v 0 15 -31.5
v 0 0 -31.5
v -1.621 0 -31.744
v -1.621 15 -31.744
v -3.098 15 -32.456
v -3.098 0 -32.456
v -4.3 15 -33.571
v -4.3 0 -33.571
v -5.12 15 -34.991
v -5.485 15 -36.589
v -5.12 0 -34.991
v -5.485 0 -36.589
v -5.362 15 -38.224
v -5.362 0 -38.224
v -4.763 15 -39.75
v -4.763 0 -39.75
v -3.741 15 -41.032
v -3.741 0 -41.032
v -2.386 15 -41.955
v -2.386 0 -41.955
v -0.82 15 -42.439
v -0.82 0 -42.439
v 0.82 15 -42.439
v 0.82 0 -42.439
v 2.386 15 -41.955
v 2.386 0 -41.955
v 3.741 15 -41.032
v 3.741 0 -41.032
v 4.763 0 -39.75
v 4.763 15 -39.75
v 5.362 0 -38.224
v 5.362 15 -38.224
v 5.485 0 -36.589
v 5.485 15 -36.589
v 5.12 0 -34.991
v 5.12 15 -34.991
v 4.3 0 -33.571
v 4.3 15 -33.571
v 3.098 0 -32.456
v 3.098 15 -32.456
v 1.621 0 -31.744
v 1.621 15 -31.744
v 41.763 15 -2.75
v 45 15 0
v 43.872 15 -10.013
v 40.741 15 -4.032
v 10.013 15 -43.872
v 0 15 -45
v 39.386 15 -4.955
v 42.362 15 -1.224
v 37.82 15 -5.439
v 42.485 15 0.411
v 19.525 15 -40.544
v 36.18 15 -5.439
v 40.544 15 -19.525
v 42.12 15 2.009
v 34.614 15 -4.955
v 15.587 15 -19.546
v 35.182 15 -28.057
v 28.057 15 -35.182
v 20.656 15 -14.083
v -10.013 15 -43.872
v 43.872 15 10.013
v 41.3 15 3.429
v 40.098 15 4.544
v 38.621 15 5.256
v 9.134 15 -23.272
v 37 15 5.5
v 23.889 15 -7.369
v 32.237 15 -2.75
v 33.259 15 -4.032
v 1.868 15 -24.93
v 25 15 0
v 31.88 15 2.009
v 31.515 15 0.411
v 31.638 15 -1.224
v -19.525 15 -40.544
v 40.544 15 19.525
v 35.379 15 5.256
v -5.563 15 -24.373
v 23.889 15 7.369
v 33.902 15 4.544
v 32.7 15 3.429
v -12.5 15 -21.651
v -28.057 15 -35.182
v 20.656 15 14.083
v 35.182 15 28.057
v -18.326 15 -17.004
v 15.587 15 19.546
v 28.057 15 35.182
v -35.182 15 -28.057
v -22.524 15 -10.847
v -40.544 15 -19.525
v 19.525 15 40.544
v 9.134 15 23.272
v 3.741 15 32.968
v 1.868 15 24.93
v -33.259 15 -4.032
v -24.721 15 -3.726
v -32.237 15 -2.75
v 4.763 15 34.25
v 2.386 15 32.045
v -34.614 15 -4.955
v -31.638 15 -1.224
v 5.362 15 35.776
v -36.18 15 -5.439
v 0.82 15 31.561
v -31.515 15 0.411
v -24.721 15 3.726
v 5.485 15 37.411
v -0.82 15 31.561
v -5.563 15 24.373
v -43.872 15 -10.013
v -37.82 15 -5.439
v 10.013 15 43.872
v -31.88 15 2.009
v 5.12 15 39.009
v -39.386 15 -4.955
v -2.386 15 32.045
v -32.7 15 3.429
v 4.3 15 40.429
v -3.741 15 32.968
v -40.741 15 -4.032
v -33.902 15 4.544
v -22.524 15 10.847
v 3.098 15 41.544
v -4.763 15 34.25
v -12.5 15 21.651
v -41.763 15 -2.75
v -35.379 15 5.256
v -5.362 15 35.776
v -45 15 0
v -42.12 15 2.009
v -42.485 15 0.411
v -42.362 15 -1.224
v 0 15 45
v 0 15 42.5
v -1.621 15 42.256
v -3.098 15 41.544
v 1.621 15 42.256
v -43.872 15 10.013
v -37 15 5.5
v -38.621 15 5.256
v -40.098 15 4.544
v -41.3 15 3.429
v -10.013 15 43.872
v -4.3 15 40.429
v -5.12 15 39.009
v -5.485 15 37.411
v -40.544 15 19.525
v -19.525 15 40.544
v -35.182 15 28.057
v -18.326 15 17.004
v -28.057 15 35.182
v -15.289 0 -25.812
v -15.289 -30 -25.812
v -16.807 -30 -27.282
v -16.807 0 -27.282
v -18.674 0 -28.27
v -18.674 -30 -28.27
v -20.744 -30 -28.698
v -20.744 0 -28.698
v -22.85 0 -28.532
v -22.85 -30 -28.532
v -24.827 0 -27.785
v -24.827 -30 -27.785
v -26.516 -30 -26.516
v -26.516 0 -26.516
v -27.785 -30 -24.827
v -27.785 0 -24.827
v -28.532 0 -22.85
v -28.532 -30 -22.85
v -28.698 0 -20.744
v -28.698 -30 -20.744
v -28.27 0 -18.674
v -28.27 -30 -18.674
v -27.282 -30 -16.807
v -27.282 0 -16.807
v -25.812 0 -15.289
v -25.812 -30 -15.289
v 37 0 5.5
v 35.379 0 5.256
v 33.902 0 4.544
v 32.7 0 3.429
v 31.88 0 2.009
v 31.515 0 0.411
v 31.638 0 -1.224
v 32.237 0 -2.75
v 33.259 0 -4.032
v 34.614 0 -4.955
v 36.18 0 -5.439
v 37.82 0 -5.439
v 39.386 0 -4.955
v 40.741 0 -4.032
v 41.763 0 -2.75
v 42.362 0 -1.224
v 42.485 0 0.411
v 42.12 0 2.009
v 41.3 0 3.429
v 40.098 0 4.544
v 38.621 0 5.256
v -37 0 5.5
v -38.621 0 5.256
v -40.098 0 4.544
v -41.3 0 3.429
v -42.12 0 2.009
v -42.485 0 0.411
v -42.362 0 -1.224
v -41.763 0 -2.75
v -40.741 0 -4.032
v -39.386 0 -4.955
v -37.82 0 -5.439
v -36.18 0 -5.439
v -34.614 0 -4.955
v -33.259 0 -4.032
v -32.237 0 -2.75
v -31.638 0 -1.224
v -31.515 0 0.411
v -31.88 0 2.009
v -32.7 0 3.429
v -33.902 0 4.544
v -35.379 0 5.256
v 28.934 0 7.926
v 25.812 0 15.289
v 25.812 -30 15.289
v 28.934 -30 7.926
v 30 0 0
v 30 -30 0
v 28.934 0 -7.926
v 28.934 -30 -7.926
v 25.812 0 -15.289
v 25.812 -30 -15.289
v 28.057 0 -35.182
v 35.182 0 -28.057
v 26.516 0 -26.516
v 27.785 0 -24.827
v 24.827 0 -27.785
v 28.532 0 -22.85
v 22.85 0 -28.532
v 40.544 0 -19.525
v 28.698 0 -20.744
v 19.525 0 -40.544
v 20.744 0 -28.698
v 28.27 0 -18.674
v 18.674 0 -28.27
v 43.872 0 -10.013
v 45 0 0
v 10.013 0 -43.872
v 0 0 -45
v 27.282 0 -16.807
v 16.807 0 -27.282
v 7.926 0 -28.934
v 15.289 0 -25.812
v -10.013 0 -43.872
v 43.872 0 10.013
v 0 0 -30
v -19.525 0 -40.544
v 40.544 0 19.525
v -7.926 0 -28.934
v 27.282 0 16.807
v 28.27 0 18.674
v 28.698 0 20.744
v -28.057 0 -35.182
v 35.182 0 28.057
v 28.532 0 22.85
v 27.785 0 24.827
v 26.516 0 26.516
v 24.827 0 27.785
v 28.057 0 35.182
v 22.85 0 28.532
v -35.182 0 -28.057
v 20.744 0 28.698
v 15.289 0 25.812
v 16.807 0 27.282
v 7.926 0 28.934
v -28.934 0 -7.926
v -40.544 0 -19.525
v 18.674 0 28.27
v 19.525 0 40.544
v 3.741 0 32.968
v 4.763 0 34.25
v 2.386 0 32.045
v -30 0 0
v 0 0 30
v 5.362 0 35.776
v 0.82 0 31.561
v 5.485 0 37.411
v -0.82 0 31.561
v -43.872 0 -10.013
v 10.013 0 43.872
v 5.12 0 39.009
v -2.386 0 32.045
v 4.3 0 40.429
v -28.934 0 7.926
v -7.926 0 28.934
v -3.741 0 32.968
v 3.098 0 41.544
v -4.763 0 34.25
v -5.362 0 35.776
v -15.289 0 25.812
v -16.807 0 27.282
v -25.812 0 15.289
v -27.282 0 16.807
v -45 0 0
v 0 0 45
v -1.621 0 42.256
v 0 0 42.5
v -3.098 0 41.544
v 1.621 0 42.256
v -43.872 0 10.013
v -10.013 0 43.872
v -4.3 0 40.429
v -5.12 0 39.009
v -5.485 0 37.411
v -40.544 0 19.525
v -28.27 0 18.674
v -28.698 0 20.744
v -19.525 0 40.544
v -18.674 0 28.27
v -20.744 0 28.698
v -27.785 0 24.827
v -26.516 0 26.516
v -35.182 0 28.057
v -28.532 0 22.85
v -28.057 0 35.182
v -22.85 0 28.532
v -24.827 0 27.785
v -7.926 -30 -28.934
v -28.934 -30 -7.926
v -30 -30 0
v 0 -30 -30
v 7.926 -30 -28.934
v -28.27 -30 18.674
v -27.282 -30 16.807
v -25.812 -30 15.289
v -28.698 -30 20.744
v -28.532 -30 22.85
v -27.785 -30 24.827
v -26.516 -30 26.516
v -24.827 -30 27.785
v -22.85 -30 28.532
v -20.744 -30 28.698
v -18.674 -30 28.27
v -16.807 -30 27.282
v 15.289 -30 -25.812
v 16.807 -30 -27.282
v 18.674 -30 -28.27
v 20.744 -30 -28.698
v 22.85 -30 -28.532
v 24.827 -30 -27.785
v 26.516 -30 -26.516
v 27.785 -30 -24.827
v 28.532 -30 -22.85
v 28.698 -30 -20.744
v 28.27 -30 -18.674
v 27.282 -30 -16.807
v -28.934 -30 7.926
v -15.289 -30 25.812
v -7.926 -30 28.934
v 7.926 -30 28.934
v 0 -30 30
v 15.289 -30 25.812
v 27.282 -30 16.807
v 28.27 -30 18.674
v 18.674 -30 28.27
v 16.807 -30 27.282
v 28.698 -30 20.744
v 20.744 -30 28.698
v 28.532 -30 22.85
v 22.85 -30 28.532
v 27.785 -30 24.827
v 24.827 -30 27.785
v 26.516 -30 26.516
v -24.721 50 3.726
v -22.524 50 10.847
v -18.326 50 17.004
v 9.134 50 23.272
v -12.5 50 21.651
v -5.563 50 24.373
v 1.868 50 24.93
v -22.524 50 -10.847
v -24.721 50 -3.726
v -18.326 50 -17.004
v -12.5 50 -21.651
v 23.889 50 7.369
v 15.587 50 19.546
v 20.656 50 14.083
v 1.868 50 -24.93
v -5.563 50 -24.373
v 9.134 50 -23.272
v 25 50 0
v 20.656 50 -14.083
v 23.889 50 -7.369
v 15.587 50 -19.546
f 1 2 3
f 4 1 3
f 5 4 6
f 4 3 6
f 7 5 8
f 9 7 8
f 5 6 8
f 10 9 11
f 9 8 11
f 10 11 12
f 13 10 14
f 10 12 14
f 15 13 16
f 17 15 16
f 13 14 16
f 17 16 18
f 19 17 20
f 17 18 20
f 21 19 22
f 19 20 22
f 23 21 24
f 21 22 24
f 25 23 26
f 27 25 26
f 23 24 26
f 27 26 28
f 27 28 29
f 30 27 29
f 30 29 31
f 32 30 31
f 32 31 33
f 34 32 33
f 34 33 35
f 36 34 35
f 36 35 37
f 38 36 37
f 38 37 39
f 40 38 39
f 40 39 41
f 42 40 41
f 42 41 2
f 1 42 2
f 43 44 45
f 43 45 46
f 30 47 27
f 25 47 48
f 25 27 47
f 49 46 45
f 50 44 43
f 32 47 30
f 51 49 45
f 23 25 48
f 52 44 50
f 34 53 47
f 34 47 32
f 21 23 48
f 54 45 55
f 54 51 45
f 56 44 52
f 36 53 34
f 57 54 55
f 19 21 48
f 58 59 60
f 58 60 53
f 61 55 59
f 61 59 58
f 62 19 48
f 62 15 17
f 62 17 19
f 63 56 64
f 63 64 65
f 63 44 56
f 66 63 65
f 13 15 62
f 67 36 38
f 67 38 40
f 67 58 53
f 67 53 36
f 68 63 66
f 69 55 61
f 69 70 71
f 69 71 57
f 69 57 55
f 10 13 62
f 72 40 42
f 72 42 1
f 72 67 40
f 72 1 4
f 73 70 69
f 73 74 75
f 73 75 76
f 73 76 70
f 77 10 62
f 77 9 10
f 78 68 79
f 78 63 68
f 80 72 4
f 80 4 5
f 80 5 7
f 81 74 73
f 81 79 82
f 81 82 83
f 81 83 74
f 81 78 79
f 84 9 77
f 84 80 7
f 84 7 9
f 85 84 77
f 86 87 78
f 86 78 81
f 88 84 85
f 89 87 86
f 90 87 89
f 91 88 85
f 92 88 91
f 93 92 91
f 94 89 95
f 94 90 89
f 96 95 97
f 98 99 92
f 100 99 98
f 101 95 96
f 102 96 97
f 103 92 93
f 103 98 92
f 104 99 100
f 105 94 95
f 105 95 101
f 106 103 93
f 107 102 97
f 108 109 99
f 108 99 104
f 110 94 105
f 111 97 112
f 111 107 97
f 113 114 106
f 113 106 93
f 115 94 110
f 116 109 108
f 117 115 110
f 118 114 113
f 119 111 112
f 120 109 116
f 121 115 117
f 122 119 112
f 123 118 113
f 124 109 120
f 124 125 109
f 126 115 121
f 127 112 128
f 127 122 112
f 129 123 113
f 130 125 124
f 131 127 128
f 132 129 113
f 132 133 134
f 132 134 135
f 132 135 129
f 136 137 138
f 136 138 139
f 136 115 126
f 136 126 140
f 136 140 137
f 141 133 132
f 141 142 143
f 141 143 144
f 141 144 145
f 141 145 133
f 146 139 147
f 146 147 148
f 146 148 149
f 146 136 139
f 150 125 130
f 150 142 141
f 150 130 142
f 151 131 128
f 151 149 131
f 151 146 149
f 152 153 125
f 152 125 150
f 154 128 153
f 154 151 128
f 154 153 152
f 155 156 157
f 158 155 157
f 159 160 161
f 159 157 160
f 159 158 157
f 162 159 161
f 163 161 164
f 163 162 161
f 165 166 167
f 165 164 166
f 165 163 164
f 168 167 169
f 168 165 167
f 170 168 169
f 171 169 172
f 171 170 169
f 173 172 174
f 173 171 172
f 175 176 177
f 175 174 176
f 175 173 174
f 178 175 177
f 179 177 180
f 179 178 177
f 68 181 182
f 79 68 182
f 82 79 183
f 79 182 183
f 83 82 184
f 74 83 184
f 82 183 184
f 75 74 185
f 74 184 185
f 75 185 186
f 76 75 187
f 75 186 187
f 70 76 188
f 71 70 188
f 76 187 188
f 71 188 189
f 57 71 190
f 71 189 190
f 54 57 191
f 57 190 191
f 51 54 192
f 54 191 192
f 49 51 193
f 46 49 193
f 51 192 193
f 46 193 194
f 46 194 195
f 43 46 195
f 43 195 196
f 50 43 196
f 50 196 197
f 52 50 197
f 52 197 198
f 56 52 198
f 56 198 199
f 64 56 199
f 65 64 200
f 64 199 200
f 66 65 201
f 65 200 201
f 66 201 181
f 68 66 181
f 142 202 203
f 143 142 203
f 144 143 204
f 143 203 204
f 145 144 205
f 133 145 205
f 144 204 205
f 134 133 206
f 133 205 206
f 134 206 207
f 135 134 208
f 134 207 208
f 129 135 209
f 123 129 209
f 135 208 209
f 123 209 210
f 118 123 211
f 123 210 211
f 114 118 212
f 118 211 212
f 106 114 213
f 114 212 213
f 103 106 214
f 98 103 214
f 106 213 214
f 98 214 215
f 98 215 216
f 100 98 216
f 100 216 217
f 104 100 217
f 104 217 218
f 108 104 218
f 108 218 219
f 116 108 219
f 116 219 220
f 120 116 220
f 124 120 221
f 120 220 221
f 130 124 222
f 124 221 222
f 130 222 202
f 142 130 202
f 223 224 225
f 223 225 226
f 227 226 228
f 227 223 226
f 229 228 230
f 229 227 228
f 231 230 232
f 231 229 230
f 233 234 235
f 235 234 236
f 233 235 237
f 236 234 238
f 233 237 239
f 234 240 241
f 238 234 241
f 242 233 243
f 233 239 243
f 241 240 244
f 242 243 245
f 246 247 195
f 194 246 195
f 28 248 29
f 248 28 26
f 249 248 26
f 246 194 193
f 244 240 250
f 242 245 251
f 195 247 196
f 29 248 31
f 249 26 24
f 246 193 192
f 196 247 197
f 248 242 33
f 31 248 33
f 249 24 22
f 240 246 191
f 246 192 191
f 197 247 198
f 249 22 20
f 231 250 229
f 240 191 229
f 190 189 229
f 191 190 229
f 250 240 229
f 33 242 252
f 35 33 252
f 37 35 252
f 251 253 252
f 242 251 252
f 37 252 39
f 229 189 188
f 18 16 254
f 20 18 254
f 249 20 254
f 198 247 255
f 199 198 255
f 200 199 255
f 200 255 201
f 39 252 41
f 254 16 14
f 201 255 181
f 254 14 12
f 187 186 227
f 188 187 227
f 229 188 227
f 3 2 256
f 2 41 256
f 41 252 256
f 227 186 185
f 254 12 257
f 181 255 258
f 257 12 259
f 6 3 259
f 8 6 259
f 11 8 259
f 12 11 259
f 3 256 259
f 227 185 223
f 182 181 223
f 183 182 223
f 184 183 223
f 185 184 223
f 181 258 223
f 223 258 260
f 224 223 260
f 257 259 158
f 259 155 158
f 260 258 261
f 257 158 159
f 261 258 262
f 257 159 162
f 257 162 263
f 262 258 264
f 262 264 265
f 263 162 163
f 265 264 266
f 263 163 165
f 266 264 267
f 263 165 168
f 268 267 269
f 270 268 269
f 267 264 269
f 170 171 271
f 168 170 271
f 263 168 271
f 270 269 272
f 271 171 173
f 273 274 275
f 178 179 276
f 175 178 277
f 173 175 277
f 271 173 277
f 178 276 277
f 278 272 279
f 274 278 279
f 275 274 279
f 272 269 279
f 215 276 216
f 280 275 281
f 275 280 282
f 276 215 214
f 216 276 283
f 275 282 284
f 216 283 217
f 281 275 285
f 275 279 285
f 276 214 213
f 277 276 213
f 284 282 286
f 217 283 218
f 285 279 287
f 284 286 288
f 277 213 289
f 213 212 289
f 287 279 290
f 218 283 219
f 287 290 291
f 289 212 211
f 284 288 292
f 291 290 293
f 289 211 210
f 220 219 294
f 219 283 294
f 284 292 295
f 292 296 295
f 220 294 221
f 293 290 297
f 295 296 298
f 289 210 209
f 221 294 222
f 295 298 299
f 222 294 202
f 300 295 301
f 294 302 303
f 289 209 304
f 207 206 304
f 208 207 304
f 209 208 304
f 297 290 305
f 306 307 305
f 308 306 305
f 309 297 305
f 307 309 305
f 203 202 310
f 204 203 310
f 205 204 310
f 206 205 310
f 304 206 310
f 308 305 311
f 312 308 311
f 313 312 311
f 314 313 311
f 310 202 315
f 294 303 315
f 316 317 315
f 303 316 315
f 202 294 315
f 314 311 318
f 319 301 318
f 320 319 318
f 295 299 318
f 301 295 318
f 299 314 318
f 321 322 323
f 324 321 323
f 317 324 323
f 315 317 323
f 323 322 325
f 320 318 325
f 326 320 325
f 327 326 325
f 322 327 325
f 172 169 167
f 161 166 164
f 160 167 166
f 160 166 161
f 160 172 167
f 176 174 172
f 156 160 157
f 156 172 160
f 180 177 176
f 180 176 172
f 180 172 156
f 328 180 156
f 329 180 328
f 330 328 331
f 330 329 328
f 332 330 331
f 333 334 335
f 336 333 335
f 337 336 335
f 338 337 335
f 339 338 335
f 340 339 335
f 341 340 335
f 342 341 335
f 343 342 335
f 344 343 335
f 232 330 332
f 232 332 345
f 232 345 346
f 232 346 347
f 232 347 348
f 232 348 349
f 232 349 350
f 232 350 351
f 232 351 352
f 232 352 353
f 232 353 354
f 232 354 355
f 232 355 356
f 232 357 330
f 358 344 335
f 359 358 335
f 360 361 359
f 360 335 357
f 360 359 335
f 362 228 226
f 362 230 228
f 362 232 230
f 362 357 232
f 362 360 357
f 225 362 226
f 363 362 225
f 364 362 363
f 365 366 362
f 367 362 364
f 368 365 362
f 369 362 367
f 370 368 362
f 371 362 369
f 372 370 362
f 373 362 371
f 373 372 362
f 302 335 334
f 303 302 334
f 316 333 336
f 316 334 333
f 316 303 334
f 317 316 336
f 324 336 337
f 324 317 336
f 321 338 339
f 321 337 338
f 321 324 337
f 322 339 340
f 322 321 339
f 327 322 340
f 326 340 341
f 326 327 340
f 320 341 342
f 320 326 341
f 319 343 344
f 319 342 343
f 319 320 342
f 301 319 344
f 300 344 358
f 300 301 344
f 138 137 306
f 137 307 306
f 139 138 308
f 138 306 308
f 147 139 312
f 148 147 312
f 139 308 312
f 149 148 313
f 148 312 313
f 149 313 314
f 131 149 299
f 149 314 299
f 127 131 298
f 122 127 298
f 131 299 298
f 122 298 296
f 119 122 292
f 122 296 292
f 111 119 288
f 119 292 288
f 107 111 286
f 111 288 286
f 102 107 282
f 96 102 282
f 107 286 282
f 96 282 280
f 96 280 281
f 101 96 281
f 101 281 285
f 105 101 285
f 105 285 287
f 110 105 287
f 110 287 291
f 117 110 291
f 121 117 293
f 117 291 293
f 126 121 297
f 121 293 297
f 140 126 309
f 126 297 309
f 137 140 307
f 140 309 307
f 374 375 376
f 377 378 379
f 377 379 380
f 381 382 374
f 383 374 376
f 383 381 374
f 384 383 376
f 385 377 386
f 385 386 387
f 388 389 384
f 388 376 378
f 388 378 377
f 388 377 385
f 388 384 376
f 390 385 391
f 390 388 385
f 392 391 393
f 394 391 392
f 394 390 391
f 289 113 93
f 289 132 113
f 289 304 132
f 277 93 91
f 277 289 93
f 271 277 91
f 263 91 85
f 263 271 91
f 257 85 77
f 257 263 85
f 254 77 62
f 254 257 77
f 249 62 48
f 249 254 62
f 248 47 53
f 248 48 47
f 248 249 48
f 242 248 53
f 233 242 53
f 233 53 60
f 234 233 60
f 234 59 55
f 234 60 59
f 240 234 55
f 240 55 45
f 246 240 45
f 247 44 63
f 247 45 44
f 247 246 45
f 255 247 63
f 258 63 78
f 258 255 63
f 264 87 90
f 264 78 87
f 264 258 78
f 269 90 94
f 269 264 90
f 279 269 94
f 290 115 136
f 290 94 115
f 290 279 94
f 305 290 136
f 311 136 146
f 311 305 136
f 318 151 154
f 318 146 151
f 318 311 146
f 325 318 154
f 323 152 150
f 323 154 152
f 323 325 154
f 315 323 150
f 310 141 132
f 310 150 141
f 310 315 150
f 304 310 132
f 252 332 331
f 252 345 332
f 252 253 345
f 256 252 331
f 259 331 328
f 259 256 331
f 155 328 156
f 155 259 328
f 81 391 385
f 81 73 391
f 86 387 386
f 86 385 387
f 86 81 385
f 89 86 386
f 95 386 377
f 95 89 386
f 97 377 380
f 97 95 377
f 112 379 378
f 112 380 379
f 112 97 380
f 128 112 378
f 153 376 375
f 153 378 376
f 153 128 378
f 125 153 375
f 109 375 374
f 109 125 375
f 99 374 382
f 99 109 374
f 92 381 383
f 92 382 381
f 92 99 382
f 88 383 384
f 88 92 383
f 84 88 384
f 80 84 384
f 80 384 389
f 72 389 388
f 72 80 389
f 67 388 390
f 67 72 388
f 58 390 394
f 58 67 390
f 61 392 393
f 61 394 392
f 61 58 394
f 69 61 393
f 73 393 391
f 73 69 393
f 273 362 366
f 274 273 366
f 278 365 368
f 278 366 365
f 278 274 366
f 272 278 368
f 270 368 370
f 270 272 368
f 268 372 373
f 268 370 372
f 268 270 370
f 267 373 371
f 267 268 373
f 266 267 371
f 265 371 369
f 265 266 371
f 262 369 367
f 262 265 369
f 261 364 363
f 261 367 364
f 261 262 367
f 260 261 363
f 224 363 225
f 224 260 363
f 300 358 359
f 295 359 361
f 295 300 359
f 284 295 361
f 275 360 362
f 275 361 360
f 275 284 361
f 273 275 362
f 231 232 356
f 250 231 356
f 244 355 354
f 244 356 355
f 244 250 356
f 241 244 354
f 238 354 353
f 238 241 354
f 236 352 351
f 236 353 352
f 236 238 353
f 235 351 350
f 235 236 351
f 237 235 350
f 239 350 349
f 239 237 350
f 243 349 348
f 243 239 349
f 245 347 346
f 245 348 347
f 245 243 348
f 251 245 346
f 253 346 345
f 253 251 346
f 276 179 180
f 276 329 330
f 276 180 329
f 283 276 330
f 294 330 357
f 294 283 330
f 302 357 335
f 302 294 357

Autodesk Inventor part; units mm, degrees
ref_plane "YZ Plane" through (0, 0, 0) normal (1, 0, 0) x (0, 1, 0)
ref_plane "XZ Plane" through (0, 0, 0) normal (0, 1, 0) x (-1, 0, 0)
ref_plane "XY Plane" through (0, 0, 0) normal (0, 0, 1) x (1, 0, 0)
sketch "Эскиз1" plane through (0, 0, 0) normal (0, 1, 0) x (-1, 0, 0)
  circle A0 centre (0, 0) radius 45
  dimension "d0" = 90
extrude "Выдавливание1" add sketch "Эскиз1" along normal blind 15
sketch "Эскиз3" plane through (0, 0, 0) normal (0, -1, 0) x (1, 0, 0)
  circle A0 centre (0, 0) radius 30
  line L0 (-15.9099, 15.9099) -> (-21.2132, 21.2132)
  line L1 (0, 0) -> (30, 0) construction
  line L2 (-15.9099, -15.9099) -> (-21.2132, -21.2132)
  line L3 (0, 0) -> (30, 0) construction
  line L4 (15.9099, -15.9099) -> (21.2132, -21.2132)
  line L5 (0, 0) -> (30, 0) construction
  line L6 (15.9099, 15.9099) -> (21.2132, 21.2132)
  line L7 (0, 0) -> (30, 0) construction
  arc A1 (-25.812, -15.2886) -> (-15.2886, -25.812) centre (-21.2132, -21.2132) ccw
  arc A2 (-15.2886, 25.812) -> (-25.812, 15.2886) centre (-21.2132, 21.2132) ccw
  arc A3 (25.812, 15.2886) -> (15.2886, 25.812) centre (21.2132, 21.2132) ccw
  arc A4 (15.2886, -25.812) -> (25.812, -15.2886) centre (21.2132, -21.2132) ccw
  dimension "d26" = 60
  dimension "d27" = 30
  dimension "d28" = 135
  dimension "d29" = 30
  dimension "d30" = 135
  dimension "d31" = 30
  dimension "d32" = 45
  dimension "d33" = 30
  dimension "d34" = 45
  dimension "d35" = 15
  dimension "d36" = 15
  dimension "d37" = 15
  dimension "d38" = 15
extrude "Выдавливание2" add sketch "Эскиз3" along normal blind 30
sketch "Эскиз4" plane through (0, 15, 0) normal (0, 1, 0) x (1, 0, 0)
  circle A0 centre (0, 0) radius 25
  dimension "d41" = 50
extrude "Выдавливание3" add sketch "Эскиз4" along normal blind 35
sketch "Эскиз5" plane through (0, 15, 0) normal (0, 1, 0) x (1, 0, 0)
  line L0 (0, 0) -> (0, -37)
  arc A0 (15.2886, 25.812) -> (-15.2886, 25.812) centre (0, 0) ccw projected
  line L1 (0, 0) -> (37, 0)
  line L2 (0, 0) -> (0, 37)
  line L3 (0, 0) -> (-37, 0)
  dimension "d44" = 37
  dimension "d45" = 37
  dimension "d46" = 37
  dimension "d47" = 37
sketch "Эскиз6" plane through (0, 15, 0) normal (0, 1, 0) x (1, 0, 0)
  point P0 (37, 0)
  point P1 (0, -37)
  point P2 (-37, 0)
  point P3 (0, 37)
hole "Отверстие2" at (37, 15, 0) at (0, 15, 37) at (-37, 15, 0) at (0, 15, -37) direction (0, -1, 0) diameter 11 end through all
properties part number "КреплениеБарабана" material "Сталь, литейная"
